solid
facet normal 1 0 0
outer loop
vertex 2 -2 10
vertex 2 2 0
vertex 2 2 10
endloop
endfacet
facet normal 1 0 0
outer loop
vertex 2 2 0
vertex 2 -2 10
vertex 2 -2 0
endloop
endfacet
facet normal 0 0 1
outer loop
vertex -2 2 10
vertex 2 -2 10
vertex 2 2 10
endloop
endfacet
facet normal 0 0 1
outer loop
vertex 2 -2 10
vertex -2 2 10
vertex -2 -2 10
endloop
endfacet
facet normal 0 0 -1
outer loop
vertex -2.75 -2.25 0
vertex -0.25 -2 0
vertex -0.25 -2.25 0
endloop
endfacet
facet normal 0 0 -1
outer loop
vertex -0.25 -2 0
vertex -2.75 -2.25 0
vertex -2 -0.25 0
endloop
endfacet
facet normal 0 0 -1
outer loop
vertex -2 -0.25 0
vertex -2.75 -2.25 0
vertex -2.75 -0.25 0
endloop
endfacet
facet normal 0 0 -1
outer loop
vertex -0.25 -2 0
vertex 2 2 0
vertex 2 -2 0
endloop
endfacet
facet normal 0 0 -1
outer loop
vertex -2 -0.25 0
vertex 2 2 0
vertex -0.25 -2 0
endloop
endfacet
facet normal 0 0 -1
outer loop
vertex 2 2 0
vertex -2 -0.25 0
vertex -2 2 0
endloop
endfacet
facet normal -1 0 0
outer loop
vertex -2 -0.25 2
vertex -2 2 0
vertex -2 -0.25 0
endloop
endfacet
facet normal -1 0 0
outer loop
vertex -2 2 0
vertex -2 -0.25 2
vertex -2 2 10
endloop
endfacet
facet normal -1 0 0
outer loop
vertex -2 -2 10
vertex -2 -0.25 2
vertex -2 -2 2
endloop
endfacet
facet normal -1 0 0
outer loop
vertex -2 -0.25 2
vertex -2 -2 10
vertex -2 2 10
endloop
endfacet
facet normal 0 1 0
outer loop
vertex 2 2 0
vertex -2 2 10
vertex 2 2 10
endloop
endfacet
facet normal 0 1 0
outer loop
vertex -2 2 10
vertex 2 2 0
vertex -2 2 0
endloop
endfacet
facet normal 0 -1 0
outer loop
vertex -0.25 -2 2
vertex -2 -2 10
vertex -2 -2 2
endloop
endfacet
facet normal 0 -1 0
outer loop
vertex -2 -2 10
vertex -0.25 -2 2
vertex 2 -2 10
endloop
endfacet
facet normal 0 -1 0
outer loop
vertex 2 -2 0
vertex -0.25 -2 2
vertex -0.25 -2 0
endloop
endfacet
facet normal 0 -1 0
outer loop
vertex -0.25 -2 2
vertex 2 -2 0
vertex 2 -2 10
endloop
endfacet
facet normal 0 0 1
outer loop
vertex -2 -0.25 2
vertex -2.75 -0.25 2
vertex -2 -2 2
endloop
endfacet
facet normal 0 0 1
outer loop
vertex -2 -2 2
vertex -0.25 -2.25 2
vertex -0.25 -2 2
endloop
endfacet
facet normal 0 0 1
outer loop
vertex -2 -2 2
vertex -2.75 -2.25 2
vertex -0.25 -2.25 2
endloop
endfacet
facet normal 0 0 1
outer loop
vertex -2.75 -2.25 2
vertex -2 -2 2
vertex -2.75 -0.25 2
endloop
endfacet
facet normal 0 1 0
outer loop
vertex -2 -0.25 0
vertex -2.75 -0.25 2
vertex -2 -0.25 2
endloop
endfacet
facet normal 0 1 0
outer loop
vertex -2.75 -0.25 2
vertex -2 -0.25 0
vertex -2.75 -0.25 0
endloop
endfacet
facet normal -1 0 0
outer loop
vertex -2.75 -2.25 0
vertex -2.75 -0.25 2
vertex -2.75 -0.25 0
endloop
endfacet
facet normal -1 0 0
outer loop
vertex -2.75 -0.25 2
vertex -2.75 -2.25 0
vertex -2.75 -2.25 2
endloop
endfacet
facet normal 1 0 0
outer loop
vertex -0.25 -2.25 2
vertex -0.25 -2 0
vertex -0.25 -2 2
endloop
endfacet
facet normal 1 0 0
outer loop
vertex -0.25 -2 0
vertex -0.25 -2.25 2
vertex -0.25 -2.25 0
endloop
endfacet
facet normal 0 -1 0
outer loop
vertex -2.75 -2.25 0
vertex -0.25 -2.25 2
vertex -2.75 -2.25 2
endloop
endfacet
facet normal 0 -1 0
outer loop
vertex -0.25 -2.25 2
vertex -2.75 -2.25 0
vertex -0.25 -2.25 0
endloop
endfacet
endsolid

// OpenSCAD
translate([0, 0, 5]) color([0,1,0,0.9]) cube([4, 4, 10], center=true);
translate([-0.5, -0.5, 1]) color([1,0,0]) cube([0.5, 0.5, 2], center=true);
translate([-1.0, -0.5, 1]) color([1,0,0]) cube([0.5, 0.5, 2], center=true);
translate([-1.5, -0.5, 1]) color([1,0,0]) cube([0.5, 0.5, 2], center=true);
translate([-2.0, -0.5, 1]) color([1,0,0]) cube([0.5, 0.5, 2], center=true);
translate([-2.5, -0.5, 1]) color([1,0,0]) cube([0.5, 0.5, 2], center=true);
translate([-0.5, -1.0, 1]) color([1,0,0]) cube([0.5, 0.5, 2], center=true);
translate([-1.0, -1.0, 1]) color([1,0,0]) cube([0.5, 0.5, 2], center=true);
translate([-1.5, -1.0, 1]) color([1,0,0]) cube([0.5, 0.5, 2], center=true);
translate([-2.0, -1.0, 1]) color([1,0,0]) cube([0.5, 0.5, 2], center=true);
translate([-2.5, -1.0, 1]) color([1,0,0]) cube([0.5, 0.5, 2], center=true);
translate([-0.5, -1.5, 1]) color([1,0,0]) cube([0.5, 0.5, 2], center=true);
translate([-1.0, -1.5, 1]) color([1,0,0]) cube([0.5, 0.5, 2], center=true);
translate([-1.5, -1.5, 1]) color([1,0,0]) cube([0.5, 0.5, 2], center=true);
translate([-2.0, -1.5, 1]) color([1,0,0]) cube([0.5, 0.5, 2], center=true);
translate([-2.5, -1.5, 1]) color([1,0,0]) cube([0.5, 0.5, 2], center=true);
translate([-0.5, -2.0, 1]) color([1,0,0]) cube([0.5, 0.5, 2], center=true);
translate([-1.0, -2.0, 1]) color([1,0,0]) cube([0.5, 0.5, 2], center=true);
translate([-1.5, -2.0, 1]) color([1,0,0]) cube([0.5, 0.5, 2], center=true);
translate([-2.0, -2.0, 1]) color([1,0,0]) cube([0.5, 0.5, 2], center=true);
translate([-2.5, -2.0, 1]) color([1,0,0]) cube([0.5, 0.5, 2], center=true);
